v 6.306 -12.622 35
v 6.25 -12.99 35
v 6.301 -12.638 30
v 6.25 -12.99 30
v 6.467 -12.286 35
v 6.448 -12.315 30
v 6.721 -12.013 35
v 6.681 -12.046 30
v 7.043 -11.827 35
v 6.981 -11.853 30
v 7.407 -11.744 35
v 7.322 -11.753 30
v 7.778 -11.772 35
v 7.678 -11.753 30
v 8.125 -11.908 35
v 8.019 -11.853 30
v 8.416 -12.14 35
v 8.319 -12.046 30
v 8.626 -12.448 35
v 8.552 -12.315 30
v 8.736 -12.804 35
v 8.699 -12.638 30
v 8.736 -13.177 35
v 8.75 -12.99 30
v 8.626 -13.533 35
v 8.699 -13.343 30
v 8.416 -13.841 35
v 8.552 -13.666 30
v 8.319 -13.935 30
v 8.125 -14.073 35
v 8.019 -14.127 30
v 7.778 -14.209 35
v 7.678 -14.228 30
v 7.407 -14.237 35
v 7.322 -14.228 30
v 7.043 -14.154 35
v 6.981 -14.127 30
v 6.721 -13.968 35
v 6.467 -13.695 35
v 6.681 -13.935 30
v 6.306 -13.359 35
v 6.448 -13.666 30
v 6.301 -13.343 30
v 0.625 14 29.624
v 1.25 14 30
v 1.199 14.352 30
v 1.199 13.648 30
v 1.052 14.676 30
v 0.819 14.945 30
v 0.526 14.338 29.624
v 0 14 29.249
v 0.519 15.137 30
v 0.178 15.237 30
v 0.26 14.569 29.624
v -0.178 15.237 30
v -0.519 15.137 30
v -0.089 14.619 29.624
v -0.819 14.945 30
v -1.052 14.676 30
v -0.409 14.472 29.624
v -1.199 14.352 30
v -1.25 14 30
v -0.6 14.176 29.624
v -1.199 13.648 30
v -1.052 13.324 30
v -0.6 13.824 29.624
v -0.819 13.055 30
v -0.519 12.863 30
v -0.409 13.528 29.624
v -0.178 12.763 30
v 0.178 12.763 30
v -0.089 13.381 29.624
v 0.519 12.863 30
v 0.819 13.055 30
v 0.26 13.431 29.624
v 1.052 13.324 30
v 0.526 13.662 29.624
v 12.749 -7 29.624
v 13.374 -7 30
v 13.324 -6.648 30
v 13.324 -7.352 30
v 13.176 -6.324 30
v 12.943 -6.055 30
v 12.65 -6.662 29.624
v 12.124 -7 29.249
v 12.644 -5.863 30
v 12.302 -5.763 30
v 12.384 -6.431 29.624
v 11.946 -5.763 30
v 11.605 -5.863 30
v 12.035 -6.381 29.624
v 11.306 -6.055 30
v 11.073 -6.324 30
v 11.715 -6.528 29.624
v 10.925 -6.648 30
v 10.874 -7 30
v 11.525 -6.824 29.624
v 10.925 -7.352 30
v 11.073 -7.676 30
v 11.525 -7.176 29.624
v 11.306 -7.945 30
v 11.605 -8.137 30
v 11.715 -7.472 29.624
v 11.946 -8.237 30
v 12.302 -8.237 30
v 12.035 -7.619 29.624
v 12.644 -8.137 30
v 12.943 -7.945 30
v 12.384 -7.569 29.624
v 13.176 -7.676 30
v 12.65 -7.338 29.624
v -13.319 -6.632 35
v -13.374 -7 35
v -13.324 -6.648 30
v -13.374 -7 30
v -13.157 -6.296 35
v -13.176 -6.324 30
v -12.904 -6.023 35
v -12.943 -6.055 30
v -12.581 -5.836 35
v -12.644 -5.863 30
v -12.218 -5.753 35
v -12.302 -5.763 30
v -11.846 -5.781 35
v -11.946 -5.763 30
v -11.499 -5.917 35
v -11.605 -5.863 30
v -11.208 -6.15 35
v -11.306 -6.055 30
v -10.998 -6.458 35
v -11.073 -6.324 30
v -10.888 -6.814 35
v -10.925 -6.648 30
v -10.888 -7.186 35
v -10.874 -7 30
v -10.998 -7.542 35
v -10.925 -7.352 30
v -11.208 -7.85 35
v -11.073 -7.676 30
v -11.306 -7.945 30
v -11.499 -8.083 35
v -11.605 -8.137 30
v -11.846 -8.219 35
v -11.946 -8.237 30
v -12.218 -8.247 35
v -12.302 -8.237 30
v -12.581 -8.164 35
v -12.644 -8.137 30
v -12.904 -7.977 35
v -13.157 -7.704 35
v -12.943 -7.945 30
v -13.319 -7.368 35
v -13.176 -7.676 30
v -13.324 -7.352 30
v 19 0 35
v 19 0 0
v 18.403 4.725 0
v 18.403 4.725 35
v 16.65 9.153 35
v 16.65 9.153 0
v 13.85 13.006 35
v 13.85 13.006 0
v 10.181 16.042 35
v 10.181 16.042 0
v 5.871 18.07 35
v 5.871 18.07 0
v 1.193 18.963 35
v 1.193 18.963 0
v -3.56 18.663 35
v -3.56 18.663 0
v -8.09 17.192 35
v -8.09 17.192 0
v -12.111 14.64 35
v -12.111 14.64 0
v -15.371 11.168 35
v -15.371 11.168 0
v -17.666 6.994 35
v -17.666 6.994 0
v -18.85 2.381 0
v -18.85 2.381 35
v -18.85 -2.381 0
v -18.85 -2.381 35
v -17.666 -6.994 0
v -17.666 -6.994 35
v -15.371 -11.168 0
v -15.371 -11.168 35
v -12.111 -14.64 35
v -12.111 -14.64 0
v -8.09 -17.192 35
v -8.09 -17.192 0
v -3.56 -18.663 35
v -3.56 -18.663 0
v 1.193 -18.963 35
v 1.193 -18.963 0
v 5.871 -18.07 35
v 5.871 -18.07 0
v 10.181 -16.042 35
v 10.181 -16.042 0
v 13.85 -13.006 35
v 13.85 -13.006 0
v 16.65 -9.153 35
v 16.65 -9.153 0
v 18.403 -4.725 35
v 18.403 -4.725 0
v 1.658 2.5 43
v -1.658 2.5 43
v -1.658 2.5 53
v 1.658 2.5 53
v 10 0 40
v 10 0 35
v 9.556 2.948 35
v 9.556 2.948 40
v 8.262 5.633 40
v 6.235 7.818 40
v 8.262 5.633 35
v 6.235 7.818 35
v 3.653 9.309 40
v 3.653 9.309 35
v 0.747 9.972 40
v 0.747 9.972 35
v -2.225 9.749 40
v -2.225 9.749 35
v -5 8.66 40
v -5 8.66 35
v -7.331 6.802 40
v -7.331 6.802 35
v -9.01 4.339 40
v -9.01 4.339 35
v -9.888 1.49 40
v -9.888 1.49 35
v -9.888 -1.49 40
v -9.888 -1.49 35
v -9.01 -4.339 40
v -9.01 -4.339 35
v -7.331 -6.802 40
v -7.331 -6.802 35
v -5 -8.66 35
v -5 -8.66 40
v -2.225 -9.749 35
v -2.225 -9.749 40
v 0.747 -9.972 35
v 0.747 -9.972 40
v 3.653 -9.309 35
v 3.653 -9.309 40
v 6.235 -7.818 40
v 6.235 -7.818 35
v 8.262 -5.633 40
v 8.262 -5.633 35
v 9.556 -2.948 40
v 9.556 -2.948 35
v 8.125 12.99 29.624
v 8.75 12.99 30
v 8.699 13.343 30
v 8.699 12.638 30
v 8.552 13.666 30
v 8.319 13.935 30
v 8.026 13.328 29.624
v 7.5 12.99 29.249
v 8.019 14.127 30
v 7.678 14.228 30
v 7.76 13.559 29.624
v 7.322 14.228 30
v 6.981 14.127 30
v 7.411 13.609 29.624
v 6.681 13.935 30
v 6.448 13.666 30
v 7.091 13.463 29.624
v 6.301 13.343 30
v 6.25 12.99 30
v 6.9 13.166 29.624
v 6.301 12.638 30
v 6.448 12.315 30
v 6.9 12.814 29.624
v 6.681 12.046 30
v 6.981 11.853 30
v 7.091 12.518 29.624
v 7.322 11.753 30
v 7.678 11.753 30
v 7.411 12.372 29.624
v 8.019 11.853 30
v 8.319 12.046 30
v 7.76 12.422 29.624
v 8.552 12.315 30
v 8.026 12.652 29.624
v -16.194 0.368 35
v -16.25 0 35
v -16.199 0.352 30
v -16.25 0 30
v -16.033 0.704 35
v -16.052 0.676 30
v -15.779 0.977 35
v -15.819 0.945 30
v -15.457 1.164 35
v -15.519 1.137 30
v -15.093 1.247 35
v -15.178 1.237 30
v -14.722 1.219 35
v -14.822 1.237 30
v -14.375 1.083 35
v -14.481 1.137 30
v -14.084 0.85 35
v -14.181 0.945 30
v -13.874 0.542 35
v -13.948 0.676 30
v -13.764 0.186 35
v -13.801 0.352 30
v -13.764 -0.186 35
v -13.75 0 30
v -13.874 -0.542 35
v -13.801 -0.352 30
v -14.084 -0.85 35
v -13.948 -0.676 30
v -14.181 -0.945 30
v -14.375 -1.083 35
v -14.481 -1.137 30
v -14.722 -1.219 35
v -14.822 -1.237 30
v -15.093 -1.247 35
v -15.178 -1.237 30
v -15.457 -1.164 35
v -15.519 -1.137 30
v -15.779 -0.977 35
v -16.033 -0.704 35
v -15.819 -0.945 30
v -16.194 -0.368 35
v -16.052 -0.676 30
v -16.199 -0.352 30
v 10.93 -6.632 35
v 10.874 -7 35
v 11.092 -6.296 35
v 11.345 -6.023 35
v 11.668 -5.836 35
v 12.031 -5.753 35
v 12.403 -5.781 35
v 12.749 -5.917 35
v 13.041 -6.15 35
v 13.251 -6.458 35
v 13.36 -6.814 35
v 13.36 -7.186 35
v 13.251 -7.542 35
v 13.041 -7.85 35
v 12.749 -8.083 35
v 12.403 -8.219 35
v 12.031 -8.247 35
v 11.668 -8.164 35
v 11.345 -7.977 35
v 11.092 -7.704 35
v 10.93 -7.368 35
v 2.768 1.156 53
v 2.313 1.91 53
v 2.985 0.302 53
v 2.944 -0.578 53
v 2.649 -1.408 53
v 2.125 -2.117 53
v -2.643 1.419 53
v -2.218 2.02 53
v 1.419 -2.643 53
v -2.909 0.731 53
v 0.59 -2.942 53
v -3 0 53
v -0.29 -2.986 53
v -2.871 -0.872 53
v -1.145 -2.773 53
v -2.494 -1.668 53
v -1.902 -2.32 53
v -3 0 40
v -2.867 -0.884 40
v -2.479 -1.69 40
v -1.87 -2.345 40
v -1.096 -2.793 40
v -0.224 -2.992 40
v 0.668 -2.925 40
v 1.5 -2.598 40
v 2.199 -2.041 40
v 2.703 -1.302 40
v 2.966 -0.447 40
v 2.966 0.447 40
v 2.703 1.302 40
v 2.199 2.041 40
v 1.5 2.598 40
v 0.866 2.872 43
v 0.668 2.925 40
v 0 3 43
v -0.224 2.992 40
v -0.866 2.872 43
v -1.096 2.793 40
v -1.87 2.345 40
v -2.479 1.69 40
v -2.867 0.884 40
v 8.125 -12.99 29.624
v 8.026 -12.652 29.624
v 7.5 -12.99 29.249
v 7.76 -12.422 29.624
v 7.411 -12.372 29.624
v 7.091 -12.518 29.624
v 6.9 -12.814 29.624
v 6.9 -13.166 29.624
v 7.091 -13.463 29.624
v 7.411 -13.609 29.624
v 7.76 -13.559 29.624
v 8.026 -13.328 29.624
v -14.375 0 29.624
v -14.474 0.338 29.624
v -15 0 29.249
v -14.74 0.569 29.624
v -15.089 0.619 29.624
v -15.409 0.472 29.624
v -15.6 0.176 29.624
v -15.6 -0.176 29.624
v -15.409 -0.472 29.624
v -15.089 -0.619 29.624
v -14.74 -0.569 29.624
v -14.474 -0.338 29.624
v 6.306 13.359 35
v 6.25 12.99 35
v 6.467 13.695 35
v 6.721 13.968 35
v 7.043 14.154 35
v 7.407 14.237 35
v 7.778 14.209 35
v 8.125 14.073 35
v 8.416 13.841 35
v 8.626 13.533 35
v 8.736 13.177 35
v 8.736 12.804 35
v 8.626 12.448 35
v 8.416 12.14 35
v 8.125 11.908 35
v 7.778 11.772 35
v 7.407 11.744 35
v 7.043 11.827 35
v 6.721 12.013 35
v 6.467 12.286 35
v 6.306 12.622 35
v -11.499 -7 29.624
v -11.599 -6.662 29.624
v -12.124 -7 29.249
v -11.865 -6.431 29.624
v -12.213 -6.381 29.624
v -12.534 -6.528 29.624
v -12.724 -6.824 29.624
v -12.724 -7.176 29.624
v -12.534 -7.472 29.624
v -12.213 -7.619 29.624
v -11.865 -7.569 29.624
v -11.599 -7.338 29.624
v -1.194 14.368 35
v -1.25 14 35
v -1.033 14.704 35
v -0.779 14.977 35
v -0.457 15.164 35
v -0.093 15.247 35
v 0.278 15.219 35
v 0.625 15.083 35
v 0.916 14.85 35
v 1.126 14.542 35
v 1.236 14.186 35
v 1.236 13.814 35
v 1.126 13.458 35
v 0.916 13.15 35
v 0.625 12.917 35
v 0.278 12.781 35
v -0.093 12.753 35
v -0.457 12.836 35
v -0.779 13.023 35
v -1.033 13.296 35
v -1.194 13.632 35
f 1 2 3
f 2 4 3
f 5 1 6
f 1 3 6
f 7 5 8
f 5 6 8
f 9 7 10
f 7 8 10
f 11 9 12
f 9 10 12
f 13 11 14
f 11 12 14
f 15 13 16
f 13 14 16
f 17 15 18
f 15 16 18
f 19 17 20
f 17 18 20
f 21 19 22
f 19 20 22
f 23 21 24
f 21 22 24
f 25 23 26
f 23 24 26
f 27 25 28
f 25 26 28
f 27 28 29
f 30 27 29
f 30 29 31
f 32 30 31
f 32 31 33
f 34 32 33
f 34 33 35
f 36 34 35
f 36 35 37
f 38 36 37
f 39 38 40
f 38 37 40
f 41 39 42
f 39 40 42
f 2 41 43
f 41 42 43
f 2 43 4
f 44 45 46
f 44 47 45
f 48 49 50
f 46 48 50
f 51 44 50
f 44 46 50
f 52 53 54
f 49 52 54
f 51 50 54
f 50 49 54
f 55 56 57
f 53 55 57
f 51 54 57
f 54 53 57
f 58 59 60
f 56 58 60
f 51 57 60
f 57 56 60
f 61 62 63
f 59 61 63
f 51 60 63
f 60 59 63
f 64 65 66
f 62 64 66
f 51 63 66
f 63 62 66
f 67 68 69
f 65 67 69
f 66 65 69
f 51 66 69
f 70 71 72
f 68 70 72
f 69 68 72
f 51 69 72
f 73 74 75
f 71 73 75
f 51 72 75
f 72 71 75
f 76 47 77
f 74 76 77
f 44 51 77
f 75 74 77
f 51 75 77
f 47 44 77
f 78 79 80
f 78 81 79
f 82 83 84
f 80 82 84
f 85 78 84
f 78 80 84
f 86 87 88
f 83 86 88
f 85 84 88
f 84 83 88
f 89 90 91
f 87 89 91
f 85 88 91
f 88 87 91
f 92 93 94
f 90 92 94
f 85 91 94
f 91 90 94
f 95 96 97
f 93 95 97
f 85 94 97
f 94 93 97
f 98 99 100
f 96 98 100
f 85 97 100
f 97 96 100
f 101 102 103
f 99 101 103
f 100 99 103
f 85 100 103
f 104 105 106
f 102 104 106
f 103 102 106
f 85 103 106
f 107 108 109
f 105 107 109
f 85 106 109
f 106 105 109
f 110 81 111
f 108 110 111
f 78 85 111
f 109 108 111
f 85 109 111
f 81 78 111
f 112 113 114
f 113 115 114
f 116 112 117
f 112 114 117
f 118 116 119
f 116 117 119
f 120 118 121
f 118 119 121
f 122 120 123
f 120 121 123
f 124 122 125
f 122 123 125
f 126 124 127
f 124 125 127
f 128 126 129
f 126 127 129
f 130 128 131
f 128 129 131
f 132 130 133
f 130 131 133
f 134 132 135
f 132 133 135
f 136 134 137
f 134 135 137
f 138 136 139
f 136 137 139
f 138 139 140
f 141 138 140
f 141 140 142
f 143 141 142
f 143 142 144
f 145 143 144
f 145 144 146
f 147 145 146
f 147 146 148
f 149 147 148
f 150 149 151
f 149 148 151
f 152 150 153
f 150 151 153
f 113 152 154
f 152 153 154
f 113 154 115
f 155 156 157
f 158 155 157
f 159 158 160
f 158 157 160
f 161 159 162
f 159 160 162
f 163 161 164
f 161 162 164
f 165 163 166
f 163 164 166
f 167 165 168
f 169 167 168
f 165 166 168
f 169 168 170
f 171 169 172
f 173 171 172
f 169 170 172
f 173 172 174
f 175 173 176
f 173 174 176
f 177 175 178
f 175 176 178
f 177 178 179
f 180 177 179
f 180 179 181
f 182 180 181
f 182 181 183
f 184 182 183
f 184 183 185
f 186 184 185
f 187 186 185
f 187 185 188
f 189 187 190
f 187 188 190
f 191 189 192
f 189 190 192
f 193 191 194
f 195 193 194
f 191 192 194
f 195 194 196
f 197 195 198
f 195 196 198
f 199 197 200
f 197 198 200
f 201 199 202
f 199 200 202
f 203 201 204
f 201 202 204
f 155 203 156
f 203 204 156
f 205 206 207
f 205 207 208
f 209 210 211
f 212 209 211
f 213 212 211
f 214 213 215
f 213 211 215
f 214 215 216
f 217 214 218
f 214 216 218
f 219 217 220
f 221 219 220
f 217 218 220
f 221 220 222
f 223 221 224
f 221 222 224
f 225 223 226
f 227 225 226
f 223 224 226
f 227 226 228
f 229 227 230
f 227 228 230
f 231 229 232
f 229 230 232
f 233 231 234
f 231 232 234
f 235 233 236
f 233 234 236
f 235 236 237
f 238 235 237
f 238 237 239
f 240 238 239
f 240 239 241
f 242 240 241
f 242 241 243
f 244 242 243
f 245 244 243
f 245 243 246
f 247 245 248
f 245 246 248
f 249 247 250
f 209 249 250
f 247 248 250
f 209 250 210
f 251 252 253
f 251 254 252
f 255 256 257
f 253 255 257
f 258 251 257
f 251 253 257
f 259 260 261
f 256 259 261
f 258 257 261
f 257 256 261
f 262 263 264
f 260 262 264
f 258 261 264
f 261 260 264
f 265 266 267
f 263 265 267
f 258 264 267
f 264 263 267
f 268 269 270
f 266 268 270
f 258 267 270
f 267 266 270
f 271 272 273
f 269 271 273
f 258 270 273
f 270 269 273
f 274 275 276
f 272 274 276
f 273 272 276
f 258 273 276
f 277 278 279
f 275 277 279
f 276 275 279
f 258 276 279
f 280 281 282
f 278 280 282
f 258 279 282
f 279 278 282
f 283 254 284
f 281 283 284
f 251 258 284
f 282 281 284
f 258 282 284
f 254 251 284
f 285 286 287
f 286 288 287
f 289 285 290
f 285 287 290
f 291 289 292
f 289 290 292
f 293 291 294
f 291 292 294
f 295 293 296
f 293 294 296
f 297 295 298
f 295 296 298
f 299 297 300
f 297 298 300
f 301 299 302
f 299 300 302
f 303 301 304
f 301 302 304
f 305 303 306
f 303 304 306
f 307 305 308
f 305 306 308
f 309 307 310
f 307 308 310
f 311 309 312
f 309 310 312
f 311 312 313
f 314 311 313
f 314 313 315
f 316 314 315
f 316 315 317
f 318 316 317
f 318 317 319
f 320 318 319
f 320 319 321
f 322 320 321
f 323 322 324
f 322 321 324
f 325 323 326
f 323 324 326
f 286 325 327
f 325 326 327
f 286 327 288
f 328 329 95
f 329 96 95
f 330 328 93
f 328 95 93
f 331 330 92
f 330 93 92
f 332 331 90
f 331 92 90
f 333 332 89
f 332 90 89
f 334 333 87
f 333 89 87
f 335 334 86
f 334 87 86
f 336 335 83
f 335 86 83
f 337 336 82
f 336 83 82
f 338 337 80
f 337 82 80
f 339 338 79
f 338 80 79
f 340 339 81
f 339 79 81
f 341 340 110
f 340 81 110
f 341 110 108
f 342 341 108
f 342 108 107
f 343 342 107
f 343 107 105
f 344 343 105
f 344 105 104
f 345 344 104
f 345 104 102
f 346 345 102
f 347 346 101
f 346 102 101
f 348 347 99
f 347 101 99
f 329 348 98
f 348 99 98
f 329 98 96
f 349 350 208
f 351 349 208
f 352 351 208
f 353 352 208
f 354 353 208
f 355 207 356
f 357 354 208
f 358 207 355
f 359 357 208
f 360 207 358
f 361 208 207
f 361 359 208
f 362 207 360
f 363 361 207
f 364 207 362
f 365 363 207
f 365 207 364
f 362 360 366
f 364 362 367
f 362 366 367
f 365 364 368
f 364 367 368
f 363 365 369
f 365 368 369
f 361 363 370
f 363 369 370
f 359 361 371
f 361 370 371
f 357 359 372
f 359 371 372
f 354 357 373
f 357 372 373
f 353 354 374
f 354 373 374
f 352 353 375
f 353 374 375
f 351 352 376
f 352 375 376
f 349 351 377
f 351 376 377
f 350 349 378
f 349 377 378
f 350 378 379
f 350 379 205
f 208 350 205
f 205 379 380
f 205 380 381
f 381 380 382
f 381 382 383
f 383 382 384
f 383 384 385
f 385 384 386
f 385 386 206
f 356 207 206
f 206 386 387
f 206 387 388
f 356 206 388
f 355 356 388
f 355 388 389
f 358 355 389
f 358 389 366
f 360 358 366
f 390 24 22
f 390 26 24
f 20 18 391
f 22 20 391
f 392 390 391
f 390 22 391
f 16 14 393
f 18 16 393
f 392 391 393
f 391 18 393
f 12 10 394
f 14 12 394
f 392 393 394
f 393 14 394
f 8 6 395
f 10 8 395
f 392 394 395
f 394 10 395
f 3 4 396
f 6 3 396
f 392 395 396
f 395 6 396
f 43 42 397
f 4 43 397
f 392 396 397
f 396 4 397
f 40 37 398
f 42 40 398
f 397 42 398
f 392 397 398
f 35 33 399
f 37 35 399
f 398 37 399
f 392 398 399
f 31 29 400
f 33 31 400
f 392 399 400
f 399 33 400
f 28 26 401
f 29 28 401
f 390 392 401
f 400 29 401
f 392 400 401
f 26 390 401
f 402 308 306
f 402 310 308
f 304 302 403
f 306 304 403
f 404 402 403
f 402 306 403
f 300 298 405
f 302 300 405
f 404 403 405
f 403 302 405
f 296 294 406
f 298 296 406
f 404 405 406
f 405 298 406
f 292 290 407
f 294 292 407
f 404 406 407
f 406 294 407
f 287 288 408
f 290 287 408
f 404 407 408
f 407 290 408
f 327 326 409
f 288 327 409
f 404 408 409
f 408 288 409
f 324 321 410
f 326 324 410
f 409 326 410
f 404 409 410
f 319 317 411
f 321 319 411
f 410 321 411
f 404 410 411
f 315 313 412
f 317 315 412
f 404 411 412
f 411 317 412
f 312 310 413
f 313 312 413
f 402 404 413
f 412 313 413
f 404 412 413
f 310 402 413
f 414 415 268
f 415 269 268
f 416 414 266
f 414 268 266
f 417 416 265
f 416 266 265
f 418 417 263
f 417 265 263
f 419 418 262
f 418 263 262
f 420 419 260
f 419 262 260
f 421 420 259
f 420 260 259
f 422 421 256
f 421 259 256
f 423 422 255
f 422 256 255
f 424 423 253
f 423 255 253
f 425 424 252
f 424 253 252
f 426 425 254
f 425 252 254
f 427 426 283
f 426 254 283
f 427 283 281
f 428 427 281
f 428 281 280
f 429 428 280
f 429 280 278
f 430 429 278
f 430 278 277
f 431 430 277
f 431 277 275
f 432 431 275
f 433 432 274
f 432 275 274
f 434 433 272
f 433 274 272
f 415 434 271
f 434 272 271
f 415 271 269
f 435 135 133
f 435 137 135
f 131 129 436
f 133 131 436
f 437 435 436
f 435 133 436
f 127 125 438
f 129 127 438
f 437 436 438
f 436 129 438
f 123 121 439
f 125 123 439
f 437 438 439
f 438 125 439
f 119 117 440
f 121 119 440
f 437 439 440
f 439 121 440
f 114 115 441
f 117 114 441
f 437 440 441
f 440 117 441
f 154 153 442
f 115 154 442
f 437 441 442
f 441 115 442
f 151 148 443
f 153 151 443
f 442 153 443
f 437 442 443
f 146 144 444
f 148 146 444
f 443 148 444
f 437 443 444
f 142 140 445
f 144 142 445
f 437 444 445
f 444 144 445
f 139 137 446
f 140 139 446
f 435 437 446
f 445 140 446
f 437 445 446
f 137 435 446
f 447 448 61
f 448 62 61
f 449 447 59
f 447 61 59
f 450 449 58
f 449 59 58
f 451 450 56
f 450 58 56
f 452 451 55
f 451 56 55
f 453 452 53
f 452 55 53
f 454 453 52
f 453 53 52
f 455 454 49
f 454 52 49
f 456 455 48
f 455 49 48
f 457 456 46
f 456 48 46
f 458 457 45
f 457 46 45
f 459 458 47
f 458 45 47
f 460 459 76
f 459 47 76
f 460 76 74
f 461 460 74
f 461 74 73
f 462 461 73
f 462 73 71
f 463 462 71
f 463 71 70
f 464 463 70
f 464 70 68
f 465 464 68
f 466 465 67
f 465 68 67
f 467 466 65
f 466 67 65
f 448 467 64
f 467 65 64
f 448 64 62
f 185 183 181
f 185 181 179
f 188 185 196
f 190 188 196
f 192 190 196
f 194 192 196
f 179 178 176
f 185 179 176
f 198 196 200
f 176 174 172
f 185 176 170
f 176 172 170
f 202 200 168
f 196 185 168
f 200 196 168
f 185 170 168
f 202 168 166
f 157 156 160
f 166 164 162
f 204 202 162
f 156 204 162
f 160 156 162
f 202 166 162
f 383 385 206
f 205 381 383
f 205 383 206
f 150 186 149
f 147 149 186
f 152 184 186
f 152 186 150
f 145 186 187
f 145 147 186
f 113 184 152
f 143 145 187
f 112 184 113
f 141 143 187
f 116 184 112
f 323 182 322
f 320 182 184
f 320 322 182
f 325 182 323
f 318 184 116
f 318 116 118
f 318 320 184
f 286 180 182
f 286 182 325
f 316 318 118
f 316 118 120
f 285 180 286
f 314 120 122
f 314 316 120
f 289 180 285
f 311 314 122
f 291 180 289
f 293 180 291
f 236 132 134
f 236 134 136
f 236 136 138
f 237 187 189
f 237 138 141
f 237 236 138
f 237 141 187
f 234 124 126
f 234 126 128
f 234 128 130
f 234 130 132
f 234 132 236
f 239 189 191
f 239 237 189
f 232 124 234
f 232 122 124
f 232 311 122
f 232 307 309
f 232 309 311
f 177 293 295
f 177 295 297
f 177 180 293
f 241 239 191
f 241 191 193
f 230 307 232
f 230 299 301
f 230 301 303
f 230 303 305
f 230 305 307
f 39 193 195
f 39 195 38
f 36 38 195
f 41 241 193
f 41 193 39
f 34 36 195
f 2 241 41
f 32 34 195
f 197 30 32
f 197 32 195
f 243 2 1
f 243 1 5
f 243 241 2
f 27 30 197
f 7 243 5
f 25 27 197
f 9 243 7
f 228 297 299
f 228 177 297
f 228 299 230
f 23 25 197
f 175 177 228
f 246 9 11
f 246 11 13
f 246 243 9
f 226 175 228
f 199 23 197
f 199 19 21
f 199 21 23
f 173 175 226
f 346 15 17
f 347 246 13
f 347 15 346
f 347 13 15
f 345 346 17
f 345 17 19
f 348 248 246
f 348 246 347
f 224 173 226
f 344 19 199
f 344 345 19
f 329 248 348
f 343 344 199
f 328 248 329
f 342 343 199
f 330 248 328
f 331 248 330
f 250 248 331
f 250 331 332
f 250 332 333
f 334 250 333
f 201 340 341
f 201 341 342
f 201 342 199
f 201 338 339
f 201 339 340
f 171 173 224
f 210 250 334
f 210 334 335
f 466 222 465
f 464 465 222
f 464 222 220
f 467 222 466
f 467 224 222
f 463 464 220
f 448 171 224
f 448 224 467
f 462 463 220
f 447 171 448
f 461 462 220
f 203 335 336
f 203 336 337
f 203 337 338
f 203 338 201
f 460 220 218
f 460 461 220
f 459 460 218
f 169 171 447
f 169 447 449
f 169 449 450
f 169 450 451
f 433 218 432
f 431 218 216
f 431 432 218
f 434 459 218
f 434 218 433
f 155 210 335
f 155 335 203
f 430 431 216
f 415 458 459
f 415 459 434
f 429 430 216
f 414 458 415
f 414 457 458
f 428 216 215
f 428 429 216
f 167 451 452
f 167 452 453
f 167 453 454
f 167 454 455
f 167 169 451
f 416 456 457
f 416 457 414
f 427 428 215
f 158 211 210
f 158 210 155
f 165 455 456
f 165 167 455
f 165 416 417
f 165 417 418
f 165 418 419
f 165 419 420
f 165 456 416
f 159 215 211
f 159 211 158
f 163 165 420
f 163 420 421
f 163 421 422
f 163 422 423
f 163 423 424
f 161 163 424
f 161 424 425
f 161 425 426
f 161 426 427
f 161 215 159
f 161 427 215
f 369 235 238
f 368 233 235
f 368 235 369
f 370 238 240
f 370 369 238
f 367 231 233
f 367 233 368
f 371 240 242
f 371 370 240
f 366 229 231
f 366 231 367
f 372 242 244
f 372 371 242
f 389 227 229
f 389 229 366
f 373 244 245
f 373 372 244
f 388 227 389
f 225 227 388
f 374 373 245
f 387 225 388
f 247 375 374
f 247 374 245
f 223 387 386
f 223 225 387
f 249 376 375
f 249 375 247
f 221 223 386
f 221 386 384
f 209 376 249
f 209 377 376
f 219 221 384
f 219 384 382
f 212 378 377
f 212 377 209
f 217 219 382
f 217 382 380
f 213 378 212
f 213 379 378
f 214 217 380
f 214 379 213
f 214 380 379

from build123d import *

# Parameters (mm, degrees)
SKETCH1_R                       = 19
BOSS_EXTRUDE1_DEPTH             = 35
SKETCH2_R                       = 10
BOSS_EXTRUDE2_DEPTH             = 5
SKETCH3_R                       = 3
BOSS_EXTRUDE3_DEPTH             = 13
CUT_EXTRUDE1_START              = -10
CUT_EXTRUDE1_DEPTH              = 10
TAP_DRILL_FOR_M3X0_5_TAP1_D     = 2.5
TAP_DRILL_FOR_M3X0_5_TAP1_DEPTH = 5
TAP_DRILL_FOR_M3X0_5_TAP1_TIP   = 0.751075774


with BuildPart() as part:
    # Sketch1 → Boss-Extrude1 (new body)
    with BuildSketch(Plane.XY):
        Circle(SKETCH1_R)
    extrude(amount=BOSS_EXTRUDE1_DEPTH)

    # Sketch2 → Boss-Extrude2 (add)
    with BuildSketch(Plane.XY.offset(35)):
        Circle(SKETCH2_R)
    extrude(amount=BOSS_EXTRUDE2_DEPTH)

    # Sketch3 → Boss-Extrude3 (add)
    with BuildSketch(Plane.XY.offset(40)):
        with Locations(Location((0, 0, 0), (0, 0, 180))):
            Circle(SKETCH3_R)
    extrude(amount=BOSS_EXTRUDE3_DEPTH)

    # Sketch4 → Cut-Extrude1 (cut)
    with BuildSketch(Plane.XY.offset(53).offset(CUT_EXTRUDE1_START)):
        with BuildLine():
            Line((-1.658312395, 2.5), (1.658312395, 2.5))
            ThreePointArc((1.658312395, 2.5), (0, 3), (-1.658312395, 2.5))
        make_face()
    extrude(amount=CUT_EXTRUDE1_DEPTH, mode=Mode.SUBTRACT)

    # Tap Drill for M3x0.5 Tap1
    with Locations(Plane.XY.offset(35)):
        with Locations((-15, 0), (0, 14), (7.5, 12.990381057), (12.124355653, -7), (7.5, -12.990381057), (-12.124355653, -7)):
            Hole(TAP_DRILL_FOR_M3X0_5_TAP1_D / 2, depth=TAP_DRILL_FOR_M3X0_5_TAP1_DEPTH)
            with Locations((0, 0, -(TAP_DRILL_FOR_M3X0_5_TAP1_DEPTH + TAP_DRILL_FOR_M3X0_5_TAP1_TIP / 2))):  # 118° drill point
                Cone(0, TAP_DRILL_FOR_M3X0_5_TAP1_D / 2, TAP_DRILL_FOR_M3X0_5_TAP1_TIP, mode=Mode.SUBTRACT)


solid = part.part
